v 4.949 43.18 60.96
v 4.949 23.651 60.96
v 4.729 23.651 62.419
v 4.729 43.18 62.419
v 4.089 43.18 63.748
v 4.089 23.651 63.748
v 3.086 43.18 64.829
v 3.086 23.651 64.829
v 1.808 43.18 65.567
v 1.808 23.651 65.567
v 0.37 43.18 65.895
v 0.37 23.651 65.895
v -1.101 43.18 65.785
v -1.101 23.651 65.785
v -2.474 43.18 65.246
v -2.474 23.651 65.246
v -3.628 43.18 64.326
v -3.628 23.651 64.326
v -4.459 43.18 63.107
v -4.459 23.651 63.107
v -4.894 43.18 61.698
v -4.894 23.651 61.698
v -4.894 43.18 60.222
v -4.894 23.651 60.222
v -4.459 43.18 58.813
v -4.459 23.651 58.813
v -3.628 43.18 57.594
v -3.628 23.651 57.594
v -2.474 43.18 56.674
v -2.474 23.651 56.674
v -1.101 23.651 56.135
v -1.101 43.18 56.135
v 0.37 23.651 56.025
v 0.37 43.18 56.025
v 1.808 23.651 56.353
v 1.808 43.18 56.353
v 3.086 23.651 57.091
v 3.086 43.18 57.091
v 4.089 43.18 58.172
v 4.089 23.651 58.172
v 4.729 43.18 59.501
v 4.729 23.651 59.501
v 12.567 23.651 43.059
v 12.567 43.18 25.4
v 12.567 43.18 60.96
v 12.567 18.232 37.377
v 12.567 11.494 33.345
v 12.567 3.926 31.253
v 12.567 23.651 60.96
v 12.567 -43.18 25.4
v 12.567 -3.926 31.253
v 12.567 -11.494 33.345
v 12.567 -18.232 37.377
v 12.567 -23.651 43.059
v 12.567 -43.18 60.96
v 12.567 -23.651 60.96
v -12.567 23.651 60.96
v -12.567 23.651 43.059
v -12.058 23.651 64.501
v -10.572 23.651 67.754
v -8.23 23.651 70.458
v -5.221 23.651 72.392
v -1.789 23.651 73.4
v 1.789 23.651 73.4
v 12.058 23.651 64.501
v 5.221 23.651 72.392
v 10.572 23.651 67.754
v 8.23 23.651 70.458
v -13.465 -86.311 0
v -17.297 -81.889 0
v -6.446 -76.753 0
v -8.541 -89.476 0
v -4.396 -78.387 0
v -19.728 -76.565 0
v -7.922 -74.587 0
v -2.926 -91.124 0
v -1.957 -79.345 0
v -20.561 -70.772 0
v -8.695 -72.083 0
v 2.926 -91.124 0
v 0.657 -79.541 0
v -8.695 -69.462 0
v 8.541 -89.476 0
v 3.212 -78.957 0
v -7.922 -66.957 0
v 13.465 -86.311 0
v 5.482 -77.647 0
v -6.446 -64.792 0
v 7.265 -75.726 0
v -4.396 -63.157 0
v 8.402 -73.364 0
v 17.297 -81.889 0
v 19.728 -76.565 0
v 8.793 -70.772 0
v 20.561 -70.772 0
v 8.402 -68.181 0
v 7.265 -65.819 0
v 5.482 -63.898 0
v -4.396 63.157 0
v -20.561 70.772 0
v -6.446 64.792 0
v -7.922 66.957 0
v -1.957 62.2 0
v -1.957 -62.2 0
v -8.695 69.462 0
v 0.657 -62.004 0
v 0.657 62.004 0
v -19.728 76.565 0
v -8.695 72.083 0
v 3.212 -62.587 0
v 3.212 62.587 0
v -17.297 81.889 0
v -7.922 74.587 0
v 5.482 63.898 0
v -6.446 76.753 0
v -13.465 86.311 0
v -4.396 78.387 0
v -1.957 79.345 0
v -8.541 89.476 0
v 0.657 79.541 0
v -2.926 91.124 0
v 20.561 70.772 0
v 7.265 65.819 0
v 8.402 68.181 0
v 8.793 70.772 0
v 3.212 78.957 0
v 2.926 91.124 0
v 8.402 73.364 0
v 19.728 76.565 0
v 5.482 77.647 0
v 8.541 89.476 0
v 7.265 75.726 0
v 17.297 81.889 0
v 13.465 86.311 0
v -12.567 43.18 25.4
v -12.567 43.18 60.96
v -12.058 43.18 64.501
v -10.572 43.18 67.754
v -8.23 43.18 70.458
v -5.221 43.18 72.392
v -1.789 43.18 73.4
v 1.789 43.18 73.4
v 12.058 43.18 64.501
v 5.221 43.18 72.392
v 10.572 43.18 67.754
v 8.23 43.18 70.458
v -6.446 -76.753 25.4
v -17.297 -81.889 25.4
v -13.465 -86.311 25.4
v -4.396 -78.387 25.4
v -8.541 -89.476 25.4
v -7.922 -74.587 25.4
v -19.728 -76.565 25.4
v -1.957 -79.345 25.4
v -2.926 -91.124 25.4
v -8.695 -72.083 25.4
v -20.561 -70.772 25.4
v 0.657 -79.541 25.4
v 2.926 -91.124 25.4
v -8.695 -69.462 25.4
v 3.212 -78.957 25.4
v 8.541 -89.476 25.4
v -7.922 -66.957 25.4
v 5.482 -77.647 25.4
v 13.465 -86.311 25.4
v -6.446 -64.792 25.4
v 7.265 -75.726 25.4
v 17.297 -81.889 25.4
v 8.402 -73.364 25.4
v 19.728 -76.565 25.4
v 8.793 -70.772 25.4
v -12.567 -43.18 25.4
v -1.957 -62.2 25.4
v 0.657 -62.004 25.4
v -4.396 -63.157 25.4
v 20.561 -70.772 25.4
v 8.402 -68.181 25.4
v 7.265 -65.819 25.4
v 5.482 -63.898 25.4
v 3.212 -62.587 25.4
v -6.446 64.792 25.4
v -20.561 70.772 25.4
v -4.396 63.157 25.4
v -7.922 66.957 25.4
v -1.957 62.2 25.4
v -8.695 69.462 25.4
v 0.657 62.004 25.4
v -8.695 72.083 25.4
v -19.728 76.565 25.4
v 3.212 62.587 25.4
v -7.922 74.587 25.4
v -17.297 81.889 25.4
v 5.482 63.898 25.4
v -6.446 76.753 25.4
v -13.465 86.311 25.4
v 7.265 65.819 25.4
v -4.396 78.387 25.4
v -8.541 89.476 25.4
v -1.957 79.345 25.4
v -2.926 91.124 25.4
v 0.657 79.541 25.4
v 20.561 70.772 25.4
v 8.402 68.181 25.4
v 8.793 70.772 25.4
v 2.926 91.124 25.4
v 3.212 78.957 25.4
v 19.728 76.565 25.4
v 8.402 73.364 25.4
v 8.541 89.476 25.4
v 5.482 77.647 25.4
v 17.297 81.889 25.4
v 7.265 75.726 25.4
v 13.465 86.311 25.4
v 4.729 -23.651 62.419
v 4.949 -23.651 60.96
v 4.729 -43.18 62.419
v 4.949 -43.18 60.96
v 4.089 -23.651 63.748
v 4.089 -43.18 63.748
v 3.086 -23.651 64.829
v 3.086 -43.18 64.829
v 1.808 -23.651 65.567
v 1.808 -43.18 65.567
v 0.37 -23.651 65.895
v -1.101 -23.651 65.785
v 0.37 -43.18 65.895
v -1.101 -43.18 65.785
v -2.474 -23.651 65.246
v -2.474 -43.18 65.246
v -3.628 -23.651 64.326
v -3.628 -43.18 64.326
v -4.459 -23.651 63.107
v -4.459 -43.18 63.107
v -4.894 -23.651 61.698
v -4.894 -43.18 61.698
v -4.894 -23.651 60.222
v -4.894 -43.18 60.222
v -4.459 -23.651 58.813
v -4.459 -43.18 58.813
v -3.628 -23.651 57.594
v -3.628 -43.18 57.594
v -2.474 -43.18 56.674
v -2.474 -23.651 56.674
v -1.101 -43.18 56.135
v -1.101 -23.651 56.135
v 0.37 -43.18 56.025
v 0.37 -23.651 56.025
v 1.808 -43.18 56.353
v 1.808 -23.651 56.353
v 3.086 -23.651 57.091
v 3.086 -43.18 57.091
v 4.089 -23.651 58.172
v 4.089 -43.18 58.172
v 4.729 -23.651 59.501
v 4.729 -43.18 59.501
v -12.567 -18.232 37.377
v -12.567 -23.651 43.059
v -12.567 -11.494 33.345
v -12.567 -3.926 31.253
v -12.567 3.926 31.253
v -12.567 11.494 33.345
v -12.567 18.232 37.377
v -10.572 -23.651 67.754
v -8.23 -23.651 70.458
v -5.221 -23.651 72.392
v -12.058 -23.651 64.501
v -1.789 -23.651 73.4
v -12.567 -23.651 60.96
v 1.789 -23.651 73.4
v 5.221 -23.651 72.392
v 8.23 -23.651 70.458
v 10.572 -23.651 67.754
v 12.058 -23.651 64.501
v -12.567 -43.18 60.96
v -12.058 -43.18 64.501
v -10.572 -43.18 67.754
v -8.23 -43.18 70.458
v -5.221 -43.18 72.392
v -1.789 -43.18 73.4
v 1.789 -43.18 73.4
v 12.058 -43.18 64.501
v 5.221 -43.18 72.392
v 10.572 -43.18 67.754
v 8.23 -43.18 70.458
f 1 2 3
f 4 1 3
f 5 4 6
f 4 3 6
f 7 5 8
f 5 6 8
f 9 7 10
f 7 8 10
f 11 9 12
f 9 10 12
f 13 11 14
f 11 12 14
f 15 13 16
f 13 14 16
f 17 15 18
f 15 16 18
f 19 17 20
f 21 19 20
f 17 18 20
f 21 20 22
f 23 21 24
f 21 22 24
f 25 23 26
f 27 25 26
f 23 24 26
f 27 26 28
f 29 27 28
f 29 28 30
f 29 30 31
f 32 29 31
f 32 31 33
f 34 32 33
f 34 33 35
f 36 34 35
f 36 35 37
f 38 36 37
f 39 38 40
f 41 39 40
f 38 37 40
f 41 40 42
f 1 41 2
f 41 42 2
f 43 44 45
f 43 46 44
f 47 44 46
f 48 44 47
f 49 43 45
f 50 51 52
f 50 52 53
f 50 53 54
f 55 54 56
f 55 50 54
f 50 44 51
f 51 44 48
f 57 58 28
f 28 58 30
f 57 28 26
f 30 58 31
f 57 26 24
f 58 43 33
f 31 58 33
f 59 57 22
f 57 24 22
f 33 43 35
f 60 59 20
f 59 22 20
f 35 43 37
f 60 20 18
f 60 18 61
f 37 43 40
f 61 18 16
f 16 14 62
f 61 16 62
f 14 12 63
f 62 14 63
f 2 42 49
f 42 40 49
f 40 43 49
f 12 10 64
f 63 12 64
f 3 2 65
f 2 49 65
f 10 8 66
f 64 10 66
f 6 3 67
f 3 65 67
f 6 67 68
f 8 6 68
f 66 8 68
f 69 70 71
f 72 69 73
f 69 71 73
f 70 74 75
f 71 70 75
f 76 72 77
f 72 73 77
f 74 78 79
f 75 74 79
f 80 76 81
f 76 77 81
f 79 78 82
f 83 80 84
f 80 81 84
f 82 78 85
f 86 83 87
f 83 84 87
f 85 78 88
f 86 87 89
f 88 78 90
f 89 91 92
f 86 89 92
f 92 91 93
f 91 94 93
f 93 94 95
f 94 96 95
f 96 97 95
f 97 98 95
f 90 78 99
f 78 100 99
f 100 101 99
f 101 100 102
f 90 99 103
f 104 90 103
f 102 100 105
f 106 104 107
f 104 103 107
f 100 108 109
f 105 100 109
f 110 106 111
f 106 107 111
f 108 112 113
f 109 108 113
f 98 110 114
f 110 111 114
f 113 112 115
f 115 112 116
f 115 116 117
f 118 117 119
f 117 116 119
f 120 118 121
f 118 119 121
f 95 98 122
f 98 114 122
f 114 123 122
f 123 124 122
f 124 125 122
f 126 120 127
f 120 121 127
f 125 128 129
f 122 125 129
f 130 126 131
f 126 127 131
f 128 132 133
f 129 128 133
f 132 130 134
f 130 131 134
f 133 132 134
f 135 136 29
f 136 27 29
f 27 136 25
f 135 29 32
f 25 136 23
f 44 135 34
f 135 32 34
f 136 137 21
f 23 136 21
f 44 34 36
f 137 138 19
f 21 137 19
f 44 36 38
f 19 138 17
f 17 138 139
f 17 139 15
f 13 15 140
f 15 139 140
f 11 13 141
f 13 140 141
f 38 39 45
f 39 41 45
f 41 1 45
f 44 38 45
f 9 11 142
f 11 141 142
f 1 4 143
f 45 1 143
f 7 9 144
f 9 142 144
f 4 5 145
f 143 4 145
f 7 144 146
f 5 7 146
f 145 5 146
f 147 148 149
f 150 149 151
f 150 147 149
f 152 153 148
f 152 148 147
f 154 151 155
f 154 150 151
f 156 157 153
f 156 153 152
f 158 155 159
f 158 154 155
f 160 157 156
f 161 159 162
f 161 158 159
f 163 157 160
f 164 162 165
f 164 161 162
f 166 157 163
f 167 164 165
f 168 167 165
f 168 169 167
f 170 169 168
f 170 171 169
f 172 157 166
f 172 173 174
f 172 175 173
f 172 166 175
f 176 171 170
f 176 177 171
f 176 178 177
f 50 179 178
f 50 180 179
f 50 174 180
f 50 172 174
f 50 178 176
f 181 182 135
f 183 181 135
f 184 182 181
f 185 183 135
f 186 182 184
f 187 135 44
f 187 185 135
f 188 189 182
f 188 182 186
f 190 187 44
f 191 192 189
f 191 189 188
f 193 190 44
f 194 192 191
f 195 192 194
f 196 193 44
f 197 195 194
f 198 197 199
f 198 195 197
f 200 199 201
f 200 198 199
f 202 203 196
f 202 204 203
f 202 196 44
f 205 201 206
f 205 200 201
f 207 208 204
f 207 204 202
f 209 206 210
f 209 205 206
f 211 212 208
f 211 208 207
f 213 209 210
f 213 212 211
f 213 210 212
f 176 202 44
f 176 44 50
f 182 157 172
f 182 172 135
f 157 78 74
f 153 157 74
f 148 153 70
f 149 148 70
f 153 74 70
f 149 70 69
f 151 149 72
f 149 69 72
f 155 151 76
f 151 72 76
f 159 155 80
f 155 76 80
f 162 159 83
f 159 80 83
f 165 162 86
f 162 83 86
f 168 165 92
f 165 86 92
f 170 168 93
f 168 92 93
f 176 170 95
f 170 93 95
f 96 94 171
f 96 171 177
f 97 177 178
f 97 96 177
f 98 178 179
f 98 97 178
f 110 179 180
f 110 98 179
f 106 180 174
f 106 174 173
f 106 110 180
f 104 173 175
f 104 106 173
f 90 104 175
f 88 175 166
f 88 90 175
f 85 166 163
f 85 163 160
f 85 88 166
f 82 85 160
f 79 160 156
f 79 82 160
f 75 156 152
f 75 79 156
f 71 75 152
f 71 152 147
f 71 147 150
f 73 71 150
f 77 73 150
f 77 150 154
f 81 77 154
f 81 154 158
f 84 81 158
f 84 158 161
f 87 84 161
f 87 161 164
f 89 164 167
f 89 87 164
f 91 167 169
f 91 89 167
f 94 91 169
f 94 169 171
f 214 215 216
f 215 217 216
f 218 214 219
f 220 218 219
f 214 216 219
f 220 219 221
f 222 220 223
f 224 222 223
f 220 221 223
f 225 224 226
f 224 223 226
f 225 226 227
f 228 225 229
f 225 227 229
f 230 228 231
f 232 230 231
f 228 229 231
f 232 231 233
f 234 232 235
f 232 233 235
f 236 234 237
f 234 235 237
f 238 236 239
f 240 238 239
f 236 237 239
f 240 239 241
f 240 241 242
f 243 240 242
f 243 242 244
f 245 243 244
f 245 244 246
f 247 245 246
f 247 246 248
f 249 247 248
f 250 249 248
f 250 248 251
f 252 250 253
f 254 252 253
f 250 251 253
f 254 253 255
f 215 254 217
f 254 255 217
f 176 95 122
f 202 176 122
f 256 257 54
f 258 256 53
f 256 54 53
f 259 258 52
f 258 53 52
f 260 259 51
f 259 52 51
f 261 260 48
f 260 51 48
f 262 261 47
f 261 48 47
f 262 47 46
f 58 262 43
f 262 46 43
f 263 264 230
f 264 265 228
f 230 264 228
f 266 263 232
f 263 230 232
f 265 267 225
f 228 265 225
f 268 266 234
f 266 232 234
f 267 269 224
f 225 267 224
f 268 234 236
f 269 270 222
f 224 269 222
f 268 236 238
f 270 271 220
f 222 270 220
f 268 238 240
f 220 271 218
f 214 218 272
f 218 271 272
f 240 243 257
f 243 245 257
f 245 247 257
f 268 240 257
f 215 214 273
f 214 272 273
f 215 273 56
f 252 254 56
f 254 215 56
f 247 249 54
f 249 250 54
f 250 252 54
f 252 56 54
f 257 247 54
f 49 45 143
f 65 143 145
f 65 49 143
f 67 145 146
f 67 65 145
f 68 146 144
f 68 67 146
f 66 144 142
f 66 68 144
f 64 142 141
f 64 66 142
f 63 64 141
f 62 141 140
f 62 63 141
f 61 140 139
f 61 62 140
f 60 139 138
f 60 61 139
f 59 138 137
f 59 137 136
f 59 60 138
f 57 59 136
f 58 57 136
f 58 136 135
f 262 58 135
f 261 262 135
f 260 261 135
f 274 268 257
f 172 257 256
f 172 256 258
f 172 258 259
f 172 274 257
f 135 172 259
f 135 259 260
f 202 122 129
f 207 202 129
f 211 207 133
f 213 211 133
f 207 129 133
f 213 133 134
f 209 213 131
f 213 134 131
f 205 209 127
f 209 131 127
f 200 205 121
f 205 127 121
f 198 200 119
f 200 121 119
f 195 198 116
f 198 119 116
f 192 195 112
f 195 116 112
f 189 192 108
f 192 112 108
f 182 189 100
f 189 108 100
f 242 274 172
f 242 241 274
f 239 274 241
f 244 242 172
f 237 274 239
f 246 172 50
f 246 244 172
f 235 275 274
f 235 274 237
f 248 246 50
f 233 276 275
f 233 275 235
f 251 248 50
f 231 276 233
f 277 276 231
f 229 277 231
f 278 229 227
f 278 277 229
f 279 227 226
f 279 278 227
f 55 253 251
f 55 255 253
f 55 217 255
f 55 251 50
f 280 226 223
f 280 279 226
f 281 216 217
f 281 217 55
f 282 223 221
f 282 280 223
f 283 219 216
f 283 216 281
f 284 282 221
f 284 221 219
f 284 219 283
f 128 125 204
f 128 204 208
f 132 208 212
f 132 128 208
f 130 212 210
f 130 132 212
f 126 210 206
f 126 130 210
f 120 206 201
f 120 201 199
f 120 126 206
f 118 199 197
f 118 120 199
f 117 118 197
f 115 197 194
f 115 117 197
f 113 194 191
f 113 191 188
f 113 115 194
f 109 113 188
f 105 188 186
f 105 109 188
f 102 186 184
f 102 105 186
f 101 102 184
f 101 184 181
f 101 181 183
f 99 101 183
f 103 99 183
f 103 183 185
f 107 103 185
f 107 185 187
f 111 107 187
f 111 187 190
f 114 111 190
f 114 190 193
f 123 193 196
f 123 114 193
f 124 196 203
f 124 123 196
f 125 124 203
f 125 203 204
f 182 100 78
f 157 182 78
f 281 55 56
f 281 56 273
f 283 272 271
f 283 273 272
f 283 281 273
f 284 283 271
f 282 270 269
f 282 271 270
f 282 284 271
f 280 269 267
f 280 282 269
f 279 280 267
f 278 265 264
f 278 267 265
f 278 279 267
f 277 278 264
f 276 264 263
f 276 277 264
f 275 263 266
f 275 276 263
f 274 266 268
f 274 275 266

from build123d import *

# Parameters (mm, degrees)
F0_R          = 8.7929686237
F1_DEPTH      = 25.4
F2_R          = 4.9489279231
F3_DEPTH      = 43.18
F3_DEPTH_BACK = 43.18
F5_DEPTH      = 25.4
F5_DEPTH_BACK = 25.4


with BuildPart() as f1:
    # F0 (on Top) → F1 (new body)
    with BuildSketch(Plane.XY):
        with BuildLine():
            ThreePointArc((-20.5612275749, -70.7723498344), (0, -91.3335774094), (20.5612275749, -70.7723498344))
            Line((20.5612275749, -70.7723498344), (20.5612275749, 70.7723498344))
            ThreePointArc((20.5612275749, 70.7723498344), (0, 91.3335774094), (-20.5612275749, 70.7723498344))
            Line((-20.5612275749, 70.7723498344), (-20.5612275749, -70.7723498344))
        make_face()
        with Locations((0, -70.7723498344)):
            Circle(F0_R, mode=Mode.SUBTRACT)
        with Locations((0, 70.7723498344)):
            Circle(F0_R, mode=Mode.SUBTRACT)
    extrude(amount=F1_DEPTH)

    # F2 (on Front) → F3 (join, two sides)
    with BuildSketch(Plane.XZ) as f3_sk:
        with BuildLine():
            Line((-12.5674372539, 25.4), (0, 25.4))
            Line((0, 25.4), (12.5674372539, 25.4))
            Line((12.5674372539, 25.4), (12.5674372539, 60.96))
            ThreePointArc((12.5674372539, 60.96), (0, 73.5274372539), (-12.5674372539, 60.96))
            Line((-12.5674372539, 60.96), (-12.5674372539, 25.4))
        make_face()
        with Locations((0, 60.96)):
            Circle(F2_R, mode=Mode.SUBTRACT)
    extrude(amount=F3_DEPTH)
    extrude(f3_sk.sketch, amount=-F3_DEPTH_BACK)

    # F4 (on Right) → F5 (cut, two sides)
    with BuildSketch(Plane.YZ) as f5_sk:
        with BuildLine():
            Line((23.6512031406, 93.859386313), (-23.6512031406, 93.859386313))
            Line((-23.6512031406, 93.859386313), (-23.6512031406, 43.059386313))
            ThreePointArc((-23.6512031406, 43.059386313), (0, 30.9874073241), (23.6512031406, 43.059386313))
            Line((23.6512031406, 43.059386313), (23.6512031406, 93.859386313))
        make_face()
    extrude(amount=-F5_DEPTH, mode=Mode.SUBTRACT)
    extrude(f5_sk.sketch, amount=F5_DEPTH_BACK, mode=Mode.SUBTRACT)


solid = f1.part
